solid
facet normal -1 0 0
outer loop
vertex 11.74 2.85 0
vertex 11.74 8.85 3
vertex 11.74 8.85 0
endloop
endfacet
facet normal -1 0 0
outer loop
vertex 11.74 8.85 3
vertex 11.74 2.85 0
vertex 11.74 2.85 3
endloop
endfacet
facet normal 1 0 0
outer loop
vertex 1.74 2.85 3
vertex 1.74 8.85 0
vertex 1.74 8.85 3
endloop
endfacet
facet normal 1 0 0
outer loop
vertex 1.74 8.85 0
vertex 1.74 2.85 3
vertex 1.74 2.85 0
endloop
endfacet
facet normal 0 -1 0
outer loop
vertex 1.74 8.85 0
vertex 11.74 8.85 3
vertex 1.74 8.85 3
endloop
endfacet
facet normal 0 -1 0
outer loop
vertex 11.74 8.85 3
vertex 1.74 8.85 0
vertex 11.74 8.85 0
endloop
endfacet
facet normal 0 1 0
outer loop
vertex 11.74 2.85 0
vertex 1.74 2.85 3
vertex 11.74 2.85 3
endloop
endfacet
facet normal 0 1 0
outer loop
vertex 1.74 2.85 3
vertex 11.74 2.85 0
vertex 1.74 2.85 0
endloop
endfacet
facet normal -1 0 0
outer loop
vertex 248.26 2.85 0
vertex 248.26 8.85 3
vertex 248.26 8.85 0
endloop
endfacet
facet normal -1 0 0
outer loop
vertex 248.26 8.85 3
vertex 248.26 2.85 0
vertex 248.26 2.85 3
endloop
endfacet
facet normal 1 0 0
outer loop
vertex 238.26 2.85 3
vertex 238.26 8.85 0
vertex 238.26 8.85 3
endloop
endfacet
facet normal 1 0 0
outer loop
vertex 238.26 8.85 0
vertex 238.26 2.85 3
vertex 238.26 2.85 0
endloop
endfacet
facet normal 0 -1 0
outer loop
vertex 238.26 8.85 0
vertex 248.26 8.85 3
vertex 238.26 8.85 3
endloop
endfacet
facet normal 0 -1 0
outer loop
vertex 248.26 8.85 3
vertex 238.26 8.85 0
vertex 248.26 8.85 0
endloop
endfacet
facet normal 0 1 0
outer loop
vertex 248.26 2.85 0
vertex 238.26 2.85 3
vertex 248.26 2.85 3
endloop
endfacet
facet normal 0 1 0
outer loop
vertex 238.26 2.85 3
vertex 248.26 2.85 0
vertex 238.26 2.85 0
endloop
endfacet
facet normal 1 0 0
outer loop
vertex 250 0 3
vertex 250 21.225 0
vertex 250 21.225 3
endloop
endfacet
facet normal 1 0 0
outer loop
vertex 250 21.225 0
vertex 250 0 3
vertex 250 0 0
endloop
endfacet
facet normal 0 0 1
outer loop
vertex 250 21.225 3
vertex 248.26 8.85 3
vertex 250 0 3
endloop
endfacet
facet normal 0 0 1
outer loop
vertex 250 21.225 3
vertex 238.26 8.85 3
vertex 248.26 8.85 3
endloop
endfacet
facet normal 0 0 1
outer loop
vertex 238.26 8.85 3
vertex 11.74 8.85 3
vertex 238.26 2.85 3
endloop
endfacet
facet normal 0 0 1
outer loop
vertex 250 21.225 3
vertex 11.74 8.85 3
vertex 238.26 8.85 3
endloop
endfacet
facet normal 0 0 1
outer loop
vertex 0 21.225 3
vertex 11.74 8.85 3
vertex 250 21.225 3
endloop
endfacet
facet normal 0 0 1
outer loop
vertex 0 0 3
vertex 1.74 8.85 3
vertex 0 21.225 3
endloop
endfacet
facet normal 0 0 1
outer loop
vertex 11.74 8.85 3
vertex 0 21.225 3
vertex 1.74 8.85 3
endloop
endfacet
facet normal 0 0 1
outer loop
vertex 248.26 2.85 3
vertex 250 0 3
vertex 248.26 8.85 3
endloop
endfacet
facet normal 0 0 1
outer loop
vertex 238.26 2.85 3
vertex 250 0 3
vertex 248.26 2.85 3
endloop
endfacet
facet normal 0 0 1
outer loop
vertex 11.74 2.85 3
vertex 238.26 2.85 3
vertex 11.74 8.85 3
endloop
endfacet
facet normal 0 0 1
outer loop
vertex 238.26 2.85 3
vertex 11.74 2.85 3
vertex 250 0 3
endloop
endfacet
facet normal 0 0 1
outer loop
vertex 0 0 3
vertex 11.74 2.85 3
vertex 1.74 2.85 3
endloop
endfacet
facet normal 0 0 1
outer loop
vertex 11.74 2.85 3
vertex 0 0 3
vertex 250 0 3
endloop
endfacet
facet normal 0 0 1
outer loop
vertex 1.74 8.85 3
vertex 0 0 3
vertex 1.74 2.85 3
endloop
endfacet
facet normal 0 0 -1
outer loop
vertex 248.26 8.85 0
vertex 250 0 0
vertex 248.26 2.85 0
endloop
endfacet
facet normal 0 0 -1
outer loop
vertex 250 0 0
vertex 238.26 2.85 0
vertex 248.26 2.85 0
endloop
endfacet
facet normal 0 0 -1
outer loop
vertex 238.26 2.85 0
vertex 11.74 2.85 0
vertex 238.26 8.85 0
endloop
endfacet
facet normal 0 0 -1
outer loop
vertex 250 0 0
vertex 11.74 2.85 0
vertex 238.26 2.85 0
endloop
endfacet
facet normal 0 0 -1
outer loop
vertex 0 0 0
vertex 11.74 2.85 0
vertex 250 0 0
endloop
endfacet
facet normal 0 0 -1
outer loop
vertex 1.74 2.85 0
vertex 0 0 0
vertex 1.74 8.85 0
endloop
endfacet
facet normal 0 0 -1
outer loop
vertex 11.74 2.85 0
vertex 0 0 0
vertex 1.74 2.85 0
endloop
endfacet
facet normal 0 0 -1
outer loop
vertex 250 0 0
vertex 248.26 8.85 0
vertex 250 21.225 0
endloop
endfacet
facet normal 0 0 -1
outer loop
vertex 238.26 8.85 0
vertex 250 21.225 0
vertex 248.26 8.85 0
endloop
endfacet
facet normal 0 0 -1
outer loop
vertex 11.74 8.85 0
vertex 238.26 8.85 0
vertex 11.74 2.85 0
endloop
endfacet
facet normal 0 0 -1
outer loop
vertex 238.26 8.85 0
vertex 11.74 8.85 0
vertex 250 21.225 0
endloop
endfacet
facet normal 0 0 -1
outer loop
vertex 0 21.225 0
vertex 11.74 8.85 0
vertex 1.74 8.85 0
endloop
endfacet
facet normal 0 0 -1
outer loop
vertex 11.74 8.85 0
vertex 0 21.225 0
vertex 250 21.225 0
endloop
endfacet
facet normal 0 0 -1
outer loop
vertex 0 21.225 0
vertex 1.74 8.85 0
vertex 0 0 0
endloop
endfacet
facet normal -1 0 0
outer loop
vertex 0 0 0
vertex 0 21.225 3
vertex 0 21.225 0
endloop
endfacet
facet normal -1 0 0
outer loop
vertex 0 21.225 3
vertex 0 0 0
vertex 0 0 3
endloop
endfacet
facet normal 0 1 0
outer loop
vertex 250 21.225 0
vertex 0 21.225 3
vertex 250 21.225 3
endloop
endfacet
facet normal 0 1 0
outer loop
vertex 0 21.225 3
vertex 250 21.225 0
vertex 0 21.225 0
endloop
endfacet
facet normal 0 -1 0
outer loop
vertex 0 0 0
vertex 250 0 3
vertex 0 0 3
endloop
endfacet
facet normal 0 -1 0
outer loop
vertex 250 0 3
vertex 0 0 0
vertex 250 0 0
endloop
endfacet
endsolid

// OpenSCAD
// TL1_Plate_0p5U_Standard
// Homelab Rack CAD Standard v1.0 - millimeters
// Mount positions provisional: test-fit against DeskPi TL1 rail!
plate_width=250;
plate_height=21.225;
plate_thickness=3;
slot_width=10;
slot_height=6;
slot_x=[6.74,243.26];
slot_y=[5.85];
difference() {
  cube([plate_width,plate_height,plate_thickness]);
  for (x=slot_x) for (y=slot_y)
    translate([x-slot_width/2,y-slot_height/2,-0.5])
      cube([slot_width,slot_height,plate_thickness+1]);
}
